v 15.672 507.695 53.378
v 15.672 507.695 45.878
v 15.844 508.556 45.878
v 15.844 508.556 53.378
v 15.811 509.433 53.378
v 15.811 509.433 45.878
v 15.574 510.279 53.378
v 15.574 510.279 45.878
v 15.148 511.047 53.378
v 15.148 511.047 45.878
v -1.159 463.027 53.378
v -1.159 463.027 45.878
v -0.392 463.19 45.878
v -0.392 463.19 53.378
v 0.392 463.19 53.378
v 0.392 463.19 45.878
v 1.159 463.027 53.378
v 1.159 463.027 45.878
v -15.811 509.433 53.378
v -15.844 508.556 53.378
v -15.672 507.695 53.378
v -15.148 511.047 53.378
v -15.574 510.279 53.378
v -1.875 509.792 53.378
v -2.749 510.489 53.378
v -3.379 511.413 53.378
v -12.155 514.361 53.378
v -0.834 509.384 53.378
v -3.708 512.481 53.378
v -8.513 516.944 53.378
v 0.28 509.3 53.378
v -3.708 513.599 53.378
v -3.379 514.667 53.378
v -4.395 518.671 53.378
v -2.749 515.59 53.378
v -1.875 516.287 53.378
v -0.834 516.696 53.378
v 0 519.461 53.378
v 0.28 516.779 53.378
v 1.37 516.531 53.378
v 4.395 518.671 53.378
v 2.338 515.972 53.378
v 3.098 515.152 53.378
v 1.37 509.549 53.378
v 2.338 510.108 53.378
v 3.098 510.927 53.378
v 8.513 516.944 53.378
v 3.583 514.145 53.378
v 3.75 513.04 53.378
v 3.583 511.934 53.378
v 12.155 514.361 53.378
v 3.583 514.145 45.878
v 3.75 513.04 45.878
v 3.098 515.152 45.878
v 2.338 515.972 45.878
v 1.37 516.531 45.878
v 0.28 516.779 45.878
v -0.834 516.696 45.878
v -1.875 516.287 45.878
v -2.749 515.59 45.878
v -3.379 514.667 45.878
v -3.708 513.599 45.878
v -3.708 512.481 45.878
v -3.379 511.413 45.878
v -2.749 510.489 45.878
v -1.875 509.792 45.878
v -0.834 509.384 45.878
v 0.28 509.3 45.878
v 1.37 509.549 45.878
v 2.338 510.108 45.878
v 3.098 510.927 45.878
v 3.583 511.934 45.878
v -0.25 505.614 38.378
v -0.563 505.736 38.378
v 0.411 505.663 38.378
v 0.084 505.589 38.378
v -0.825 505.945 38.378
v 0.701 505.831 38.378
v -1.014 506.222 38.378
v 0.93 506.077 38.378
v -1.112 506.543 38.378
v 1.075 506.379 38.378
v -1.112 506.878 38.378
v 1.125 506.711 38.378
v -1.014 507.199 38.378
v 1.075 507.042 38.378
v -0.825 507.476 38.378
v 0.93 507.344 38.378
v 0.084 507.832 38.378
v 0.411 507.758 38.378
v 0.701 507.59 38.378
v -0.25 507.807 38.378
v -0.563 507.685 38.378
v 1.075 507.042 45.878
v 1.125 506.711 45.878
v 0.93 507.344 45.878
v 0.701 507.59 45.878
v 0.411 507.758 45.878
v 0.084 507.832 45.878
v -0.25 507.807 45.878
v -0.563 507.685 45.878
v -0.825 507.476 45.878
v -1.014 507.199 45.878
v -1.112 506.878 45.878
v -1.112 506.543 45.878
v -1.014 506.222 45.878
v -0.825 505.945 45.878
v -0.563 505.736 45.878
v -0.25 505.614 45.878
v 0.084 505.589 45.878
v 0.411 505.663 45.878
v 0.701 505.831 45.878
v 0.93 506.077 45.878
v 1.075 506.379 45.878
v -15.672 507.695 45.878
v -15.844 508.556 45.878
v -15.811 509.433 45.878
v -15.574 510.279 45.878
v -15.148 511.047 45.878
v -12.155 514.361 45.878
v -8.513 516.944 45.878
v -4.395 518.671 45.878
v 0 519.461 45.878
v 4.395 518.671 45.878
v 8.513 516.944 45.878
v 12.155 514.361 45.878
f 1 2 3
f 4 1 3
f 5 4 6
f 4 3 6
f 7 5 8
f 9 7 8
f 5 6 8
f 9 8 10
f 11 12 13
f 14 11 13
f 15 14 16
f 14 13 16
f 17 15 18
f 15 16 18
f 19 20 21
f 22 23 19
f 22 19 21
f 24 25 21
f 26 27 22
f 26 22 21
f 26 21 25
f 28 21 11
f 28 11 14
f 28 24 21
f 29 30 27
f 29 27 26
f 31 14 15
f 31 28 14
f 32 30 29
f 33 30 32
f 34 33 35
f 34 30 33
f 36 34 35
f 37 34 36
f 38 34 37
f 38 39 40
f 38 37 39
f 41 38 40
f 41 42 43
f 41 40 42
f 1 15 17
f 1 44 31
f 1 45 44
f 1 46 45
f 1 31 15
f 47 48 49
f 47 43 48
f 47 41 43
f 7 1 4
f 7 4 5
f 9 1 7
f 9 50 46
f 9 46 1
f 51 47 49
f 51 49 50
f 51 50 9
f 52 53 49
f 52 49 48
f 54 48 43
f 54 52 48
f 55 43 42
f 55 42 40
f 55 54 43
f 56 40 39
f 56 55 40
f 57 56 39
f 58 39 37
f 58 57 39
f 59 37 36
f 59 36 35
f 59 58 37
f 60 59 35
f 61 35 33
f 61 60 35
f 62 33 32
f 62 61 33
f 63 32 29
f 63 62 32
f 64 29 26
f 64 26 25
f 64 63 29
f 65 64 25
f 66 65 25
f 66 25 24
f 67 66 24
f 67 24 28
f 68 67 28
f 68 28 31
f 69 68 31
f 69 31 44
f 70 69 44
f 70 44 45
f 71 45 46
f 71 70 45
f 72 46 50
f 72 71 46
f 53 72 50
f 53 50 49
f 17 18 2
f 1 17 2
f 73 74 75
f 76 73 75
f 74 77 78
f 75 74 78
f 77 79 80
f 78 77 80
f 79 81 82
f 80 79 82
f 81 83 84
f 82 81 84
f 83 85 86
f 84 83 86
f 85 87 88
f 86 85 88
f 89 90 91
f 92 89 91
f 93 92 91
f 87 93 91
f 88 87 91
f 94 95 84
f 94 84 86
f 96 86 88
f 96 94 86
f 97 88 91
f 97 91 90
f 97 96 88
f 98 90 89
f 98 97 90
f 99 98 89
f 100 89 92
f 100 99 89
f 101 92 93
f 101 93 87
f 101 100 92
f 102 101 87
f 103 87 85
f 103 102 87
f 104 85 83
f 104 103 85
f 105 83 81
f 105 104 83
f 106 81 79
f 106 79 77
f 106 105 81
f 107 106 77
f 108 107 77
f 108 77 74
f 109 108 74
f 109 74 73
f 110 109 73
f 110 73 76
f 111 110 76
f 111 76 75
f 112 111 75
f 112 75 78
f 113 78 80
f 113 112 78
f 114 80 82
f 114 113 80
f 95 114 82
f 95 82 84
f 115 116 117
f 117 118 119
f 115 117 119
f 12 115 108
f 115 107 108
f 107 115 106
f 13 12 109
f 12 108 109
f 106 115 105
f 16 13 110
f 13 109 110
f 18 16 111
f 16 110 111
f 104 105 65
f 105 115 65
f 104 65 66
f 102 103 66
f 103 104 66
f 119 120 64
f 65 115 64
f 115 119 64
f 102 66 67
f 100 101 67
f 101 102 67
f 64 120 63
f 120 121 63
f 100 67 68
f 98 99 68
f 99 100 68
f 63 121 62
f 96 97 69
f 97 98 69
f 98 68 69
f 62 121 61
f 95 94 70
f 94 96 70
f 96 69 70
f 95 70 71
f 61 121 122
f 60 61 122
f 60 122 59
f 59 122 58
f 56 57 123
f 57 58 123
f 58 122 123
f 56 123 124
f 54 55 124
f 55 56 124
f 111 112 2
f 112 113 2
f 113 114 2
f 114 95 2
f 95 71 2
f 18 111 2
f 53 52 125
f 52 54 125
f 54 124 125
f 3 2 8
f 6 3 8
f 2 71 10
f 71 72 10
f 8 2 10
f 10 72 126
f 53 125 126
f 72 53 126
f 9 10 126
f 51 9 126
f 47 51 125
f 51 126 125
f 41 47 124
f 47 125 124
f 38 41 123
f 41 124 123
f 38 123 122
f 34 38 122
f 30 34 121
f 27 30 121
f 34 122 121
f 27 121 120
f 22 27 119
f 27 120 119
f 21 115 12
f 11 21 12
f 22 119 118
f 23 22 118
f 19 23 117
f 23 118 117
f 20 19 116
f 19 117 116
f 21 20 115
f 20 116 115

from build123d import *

# Parameters (mm, degrees)
SKETCH1_R           = 50
BOSS_EXTRUDE1_DEPTH = 100
SKETCH3_R           = 15
BOSS_EXTRUDE2_DEPTH = 100
ECHELLE1_SCALE      = 0.075


with BuildPart() as part:
    # Sketch1 → Boss-Extrude1 (new body)
    with BuildSketch(Plane.XY):
        with BuildLine():
            Line((15.450849719, 47.552825815), (208.963323447, 643.122980447))
            ThreePointArc((208.963323447, 643.122980447), (210.809153806, 666.305115195), (201.968702079, 687.814761274))
            ThreePointArc((201.968702079, 687.814761274), (113.501706094, 766.442555341), (0, 800))
            ThreePointArc((0, 800), (-113.501706094, 766.442555341), (-201.968702079, 687.814761274))
            ThreePointArc((-201.968702079, 687.814761274), (-210.809153806, 666.305115195), (-208.963323447, 643.122980447))
            Line((-208.963323447, 643.122980447), (-15.450849719, 47.552825815))
            ThreePointArc((-15.450849719, 47.552825815), (0, 50), (15.450849719, 47.552825815))
        make_face()
        with Locations((0, 714.39)):
            Circle(SKETCH1_R, mode=Mode.SUBTRACT)
    extrude(amount=BOSS_EXTRUDE1_DEPTH)

    # Sketch3 → Boss-Extrude2 (add)
    with BuildSketch(Plane.XY):
        with Locations((0, 630)):
            Circle(SKETCH3_R)
    extrude(amount=-BOSS_EXTRUDE2_DEPTH)


with BuildPart() as part_1:
    # Echelle1: scaled about (0, 496.714078895, 49.597985562)
    add(part.part.scale(ECHELLE1_SCALE).moved(Location((0, 459.460522978, 45.878136645))))


solid = part_1.part
